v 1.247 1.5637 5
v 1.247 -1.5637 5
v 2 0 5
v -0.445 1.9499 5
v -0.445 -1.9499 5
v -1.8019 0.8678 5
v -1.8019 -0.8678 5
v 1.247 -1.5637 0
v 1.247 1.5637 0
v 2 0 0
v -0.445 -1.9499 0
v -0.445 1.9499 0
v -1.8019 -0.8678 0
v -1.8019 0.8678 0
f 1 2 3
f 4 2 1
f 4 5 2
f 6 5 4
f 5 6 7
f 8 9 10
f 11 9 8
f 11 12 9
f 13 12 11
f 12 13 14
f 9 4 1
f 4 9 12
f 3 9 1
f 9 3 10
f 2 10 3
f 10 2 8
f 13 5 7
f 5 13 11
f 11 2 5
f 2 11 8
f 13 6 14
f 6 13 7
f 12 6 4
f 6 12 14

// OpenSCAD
// Generated by generate_scads.py
intersection() {
  intersection() {
    cylinder(h=5, r=8, center=false);
    cylinder(h=15, r=10, center=true);
    cylinder(h=30, r=2, center=false);
    cylinder(h=15, r=8, center=true);
  }
}
